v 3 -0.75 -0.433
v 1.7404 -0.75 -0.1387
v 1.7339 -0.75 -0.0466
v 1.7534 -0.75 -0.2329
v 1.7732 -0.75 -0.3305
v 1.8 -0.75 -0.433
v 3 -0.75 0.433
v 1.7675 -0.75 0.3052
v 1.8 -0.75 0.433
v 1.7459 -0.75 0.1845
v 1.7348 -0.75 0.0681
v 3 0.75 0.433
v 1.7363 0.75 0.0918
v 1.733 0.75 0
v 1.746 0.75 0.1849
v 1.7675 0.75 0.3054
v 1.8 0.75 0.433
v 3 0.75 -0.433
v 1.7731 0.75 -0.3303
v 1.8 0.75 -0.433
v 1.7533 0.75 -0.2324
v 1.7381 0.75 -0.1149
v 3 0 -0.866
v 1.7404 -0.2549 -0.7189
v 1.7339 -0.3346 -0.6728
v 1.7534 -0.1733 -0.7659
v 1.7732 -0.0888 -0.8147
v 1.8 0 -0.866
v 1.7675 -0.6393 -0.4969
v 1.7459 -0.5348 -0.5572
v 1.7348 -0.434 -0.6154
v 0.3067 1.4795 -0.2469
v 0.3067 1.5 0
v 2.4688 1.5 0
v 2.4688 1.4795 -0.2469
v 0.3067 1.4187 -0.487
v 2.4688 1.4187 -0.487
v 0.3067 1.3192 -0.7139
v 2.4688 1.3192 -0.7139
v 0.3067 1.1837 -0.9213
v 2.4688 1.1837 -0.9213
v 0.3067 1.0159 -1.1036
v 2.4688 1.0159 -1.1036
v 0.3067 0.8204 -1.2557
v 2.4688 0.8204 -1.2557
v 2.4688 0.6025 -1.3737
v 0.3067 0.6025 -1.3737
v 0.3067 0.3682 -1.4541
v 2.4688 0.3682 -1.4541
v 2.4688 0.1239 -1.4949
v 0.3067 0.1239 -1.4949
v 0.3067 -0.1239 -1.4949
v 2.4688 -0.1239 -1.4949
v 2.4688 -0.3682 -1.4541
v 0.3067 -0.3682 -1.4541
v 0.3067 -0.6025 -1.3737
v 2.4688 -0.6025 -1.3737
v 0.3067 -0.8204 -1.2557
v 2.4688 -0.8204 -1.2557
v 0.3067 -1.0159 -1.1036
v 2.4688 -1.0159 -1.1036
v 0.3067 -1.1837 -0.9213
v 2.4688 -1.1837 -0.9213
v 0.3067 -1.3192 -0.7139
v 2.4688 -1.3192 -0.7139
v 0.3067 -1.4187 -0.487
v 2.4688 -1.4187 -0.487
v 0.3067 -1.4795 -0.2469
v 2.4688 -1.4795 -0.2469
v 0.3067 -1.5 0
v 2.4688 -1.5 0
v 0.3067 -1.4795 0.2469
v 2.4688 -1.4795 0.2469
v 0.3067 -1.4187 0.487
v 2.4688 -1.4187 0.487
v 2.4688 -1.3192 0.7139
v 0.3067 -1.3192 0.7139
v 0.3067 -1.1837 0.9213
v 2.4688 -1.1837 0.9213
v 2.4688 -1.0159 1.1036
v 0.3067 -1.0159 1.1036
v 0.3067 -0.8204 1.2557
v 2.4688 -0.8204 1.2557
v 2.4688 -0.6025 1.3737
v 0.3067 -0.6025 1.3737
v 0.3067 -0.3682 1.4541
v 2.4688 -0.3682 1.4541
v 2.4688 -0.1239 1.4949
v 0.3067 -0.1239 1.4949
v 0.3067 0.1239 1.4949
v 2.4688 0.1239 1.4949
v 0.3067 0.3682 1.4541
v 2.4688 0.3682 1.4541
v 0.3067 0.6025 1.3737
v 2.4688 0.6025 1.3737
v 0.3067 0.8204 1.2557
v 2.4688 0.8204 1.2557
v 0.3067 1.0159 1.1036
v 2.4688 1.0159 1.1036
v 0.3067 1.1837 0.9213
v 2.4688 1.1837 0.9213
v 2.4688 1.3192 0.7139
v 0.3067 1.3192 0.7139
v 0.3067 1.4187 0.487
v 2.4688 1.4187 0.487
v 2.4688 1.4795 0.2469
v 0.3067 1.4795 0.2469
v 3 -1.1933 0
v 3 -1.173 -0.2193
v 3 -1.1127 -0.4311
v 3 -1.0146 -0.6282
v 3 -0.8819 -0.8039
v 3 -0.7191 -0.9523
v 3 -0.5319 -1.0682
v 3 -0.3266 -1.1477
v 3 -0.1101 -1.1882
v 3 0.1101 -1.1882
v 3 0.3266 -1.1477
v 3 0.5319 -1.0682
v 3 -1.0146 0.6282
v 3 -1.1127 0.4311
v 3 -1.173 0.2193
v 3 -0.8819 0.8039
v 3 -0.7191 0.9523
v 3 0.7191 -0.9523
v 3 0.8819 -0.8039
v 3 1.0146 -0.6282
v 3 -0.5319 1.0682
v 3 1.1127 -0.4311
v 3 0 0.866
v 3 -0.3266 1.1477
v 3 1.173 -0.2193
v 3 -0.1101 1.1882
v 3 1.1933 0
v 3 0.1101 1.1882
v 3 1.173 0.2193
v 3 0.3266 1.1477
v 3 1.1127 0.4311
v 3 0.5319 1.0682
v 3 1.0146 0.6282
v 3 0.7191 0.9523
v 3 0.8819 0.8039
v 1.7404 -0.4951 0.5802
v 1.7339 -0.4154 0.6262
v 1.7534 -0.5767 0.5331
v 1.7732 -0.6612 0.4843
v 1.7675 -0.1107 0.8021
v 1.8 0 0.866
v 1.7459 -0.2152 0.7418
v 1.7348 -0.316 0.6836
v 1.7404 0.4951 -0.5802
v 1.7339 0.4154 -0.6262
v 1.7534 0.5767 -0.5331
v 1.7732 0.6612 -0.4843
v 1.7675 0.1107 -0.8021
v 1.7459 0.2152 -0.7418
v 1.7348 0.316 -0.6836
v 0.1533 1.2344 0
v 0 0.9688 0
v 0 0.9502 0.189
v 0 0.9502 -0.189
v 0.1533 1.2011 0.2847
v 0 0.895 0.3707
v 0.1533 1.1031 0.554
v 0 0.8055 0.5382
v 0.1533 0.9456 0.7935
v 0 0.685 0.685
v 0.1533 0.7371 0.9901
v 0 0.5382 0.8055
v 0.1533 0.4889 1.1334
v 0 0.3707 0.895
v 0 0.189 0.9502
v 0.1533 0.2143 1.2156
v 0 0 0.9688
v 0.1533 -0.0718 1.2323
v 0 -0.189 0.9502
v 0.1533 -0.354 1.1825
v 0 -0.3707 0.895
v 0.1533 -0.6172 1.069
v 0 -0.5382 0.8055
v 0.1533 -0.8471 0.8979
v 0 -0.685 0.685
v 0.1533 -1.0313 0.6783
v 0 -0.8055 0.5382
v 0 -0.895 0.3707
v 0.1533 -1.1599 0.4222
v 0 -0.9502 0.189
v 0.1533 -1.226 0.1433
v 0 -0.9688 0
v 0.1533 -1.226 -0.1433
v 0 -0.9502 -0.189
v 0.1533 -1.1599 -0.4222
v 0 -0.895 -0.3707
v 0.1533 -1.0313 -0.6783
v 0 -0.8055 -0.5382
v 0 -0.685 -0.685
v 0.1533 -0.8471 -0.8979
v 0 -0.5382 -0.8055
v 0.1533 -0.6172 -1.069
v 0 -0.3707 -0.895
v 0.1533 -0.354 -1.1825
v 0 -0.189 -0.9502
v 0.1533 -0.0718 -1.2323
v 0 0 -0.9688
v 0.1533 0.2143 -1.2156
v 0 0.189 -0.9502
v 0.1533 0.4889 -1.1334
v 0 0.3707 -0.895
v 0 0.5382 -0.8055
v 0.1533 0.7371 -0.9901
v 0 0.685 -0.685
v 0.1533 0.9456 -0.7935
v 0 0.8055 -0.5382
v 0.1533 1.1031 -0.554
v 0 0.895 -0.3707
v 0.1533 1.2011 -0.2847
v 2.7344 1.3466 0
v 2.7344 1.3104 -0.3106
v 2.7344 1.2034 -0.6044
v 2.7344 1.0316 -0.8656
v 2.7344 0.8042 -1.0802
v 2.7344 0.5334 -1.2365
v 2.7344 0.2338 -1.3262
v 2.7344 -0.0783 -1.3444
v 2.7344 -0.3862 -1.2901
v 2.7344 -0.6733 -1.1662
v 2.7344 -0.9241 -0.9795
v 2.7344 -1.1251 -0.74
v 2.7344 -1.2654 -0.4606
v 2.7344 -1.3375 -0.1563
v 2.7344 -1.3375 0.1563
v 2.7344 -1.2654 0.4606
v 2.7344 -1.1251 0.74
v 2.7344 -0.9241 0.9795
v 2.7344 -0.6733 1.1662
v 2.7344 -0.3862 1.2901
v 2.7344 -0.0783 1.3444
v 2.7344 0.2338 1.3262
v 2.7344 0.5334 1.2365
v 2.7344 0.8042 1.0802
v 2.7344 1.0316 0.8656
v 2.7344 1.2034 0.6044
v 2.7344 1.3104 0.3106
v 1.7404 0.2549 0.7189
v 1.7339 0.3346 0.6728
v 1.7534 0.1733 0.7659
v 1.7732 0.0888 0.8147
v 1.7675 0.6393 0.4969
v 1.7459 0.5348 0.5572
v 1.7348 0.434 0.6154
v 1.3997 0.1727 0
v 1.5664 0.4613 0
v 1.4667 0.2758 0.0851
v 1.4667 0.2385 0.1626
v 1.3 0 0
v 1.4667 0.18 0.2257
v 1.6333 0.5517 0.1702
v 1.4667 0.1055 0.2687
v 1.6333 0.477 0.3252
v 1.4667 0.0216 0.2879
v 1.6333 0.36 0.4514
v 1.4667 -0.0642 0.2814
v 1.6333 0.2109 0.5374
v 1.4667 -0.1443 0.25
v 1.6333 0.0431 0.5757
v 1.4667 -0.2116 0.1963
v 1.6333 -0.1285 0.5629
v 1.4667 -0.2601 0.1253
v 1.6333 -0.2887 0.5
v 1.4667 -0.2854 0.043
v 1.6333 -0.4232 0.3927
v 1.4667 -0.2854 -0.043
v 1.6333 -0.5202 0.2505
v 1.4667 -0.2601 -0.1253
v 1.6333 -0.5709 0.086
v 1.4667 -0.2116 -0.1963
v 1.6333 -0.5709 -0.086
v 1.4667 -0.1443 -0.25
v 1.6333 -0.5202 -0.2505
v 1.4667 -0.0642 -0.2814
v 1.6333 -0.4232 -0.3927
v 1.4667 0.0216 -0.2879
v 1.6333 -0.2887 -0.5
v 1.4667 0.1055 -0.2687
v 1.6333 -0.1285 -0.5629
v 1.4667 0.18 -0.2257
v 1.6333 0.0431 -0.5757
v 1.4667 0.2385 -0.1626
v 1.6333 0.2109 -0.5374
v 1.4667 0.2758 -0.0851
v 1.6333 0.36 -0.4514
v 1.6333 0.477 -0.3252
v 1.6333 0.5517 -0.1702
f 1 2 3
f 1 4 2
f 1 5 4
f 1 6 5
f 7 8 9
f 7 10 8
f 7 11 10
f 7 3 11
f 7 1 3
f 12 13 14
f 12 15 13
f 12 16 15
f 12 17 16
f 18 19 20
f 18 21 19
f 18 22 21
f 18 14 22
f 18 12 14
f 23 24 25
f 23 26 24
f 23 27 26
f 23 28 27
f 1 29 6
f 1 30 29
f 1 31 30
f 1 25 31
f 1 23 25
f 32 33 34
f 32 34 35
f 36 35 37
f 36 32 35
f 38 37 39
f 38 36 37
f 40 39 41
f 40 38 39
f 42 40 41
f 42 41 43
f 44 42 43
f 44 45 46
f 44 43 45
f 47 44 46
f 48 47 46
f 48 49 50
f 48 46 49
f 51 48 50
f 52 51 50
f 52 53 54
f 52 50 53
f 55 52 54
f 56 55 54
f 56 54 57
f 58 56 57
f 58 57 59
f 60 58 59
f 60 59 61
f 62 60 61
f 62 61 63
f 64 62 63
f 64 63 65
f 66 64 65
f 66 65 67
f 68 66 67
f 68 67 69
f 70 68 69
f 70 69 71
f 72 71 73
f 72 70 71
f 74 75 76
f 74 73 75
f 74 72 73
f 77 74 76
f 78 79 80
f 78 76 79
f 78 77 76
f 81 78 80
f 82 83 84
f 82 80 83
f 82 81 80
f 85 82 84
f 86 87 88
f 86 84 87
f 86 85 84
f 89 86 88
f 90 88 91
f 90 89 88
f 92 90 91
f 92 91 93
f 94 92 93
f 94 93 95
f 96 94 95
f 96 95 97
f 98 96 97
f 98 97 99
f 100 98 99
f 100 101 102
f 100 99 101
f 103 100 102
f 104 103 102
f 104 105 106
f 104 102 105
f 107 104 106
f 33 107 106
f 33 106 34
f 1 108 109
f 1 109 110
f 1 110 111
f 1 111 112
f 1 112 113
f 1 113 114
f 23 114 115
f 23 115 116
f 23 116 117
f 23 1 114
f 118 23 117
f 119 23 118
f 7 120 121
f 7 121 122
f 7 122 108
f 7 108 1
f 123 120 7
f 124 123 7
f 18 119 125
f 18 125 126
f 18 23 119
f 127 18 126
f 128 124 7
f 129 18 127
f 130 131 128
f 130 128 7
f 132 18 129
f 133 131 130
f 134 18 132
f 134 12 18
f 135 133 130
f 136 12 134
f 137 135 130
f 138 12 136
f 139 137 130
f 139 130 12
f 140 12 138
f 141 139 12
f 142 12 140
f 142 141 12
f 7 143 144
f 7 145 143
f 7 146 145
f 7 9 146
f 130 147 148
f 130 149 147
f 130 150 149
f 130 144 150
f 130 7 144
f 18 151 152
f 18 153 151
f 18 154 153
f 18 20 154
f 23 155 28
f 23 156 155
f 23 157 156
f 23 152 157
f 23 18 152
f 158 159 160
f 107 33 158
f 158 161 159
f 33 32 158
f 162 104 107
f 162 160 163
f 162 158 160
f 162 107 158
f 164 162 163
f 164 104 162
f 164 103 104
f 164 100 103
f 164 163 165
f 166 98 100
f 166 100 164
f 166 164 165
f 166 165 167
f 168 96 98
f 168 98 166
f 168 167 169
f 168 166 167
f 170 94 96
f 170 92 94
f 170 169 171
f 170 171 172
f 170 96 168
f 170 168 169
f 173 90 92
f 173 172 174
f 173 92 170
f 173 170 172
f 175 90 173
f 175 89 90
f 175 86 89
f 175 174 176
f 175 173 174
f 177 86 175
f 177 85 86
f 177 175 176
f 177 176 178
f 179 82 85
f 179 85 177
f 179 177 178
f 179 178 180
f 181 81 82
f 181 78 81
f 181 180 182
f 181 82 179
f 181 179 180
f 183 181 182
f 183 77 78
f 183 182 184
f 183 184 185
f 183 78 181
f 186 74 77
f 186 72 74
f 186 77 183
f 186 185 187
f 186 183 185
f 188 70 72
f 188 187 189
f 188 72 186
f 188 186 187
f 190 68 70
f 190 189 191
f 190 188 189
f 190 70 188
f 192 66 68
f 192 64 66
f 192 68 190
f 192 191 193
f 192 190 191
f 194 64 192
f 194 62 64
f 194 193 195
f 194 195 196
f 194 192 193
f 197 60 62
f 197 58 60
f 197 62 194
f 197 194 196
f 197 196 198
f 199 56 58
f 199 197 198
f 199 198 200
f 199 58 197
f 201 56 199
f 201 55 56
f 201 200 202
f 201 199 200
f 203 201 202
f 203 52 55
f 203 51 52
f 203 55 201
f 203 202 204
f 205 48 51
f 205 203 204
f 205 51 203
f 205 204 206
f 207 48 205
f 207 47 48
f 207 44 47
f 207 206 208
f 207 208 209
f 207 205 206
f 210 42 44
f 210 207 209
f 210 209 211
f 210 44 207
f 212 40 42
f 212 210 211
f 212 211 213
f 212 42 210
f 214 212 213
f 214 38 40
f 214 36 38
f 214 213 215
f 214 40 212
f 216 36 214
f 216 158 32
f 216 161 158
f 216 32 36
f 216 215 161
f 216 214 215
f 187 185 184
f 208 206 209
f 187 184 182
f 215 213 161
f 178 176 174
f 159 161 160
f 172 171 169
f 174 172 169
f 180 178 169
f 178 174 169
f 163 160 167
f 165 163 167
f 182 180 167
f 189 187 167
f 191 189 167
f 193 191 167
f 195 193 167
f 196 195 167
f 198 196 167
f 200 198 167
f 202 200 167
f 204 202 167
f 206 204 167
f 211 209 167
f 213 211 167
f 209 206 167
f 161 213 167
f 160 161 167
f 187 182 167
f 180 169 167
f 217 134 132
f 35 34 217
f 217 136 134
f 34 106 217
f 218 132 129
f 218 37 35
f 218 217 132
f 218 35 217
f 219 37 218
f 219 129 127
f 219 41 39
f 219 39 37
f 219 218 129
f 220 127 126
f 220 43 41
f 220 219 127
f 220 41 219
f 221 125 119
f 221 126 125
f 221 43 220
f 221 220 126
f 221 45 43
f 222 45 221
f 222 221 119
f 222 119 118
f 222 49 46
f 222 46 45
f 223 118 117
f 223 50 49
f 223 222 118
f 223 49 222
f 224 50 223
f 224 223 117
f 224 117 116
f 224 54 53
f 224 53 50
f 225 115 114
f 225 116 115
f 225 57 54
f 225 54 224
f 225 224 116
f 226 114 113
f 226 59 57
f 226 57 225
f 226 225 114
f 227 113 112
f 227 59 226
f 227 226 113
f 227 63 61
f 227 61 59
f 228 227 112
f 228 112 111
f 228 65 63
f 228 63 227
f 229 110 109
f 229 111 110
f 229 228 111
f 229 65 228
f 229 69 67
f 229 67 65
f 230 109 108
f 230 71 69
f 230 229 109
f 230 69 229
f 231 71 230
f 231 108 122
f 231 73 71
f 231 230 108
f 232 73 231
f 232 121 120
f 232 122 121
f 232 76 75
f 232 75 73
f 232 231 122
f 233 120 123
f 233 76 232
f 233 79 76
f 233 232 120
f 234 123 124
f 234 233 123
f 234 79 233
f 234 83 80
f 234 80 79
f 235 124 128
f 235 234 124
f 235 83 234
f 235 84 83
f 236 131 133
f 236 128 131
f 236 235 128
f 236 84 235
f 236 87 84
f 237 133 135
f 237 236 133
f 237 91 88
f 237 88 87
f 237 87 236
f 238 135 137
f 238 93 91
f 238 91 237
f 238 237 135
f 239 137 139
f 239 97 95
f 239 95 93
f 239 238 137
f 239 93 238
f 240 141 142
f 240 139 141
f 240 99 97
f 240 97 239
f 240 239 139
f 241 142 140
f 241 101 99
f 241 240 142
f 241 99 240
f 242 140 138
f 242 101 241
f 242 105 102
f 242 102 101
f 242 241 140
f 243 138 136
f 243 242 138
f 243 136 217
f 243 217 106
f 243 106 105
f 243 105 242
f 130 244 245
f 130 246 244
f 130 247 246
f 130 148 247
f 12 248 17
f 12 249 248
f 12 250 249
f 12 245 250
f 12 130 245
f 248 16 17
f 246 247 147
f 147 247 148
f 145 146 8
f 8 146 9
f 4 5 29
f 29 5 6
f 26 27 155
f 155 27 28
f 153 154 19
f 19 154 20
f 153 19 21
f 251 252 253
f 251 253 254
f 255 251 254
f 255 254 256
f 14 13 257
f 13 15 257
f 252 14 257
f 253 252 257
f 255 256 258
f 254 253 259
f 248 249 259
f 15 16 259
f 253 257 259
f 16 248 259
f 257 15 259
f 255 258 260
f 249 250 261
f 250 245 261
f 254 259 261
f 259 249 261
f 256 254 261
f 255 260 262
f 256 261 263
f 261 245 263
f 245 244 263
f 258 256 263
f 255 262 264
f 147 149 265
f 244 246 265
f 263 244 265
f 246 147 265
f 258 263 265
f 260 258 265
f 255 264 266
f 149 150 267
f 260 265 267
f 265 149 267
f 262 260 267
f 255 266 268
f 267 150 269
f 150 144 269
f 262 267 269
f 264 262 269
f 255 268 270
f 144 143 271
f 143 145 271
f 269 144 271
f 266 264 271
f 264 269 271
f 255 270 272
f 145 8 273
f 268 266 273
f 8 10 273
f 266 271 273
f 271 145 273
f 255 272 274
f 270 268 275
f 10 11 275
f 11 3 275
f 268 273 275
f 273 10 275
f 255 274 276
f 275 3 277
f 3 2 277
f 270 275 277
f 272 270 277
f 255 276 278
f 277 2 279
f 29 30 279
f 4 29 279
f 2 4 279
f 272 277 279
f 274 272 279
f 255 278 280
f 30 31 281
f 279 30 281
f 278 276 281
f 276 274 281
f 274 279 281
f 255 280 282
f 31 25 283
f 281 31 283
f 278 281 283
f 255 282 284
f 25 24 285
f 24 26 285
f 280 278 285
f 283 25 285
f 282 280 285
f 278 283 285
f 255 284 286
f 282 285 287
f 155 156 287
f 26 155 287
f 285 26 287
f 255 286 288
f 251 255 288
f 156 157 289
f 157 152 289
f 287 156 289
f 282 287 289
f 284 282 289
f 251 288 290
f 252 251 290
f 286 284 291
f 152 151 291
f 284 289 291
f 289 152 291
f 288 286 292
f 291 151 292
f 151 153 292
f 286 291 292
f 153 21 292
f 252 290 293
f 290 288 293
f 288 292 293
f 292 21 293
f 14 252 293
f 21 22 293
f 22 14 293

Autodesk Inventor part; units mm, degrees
ref_plane "YZ Plane" through (0, 0, 0) normal (1, 0, 0) x (0, 1, 0)
ref_plane "XZ Plane" through (0, 0, 0) normal (0, 1, 0) x (-1, 0, 0)
sketch "Sketch1" plane through (0, 0, 0) normal (0, 0, 1) x (1, 0, 0)
  line L0 (0, 0) -> (1.3, 0)
  line L1 (3, 0.866) -> (3, 1.5)
  line L2 (3, 1.5) -> (0, 1.5)
  line L3 (3, 0.866) -> (1.8, 0.866)
  line L4 (1.8, 0.866) -> (1.3, 0)
  line L5 (0, -0.3) -> (0, 1.8) projected
  line L6 (0, 1.5) -> (0, 0)
  dimension "d0" = 1.2
  dimension "d1" = 60
  dimension "d2" = 3
  dimension "d3" = 1.7321
  dimension "d5" = 3
revolve "Body" add sketch "Sketch1" angle 360 about axis through (0, 0, 0) along (1, 0, 0)
chamfer "Chamfer1" distance 0.3067 angle 60 1 edges at (3, -1.5, 0) measured on face at (3, 1.2741, -0.1197)
sketch "Sketch2" plane through (3, 0, 0) normal (1, 0, 0) x (0, 0, -1)
  circle A0 centre (0, 0) radius 0.866 projected
  line L0 (-0.433, 0.75) -> (0.433, 0.75)
  line L1 (0.433, 0.75) -> (0.866, 0)
  line L2 (0.866, 0) -> (0.433, -0.75)
  line L3 (0.433, -0.75) -> (-0.433, -0.75)
  line L4 (-0.433, -0.75) -> (-0.866, 0)
  line L5 (-0.866, 0) -> (-0.433, 0.75)
  point P0 (0, 0)
  point P1 (0, 0)
extrude "Slot" add sketch "Sketch2" against normal up to next contours L1 A0 | A0 L2 | L0 A0 | A0 L3 | L5 A0 | A0 L4
thread "Thread" size "M3x0.5" class "6g" standard "ISO Metric profile" length 3
chamfer "Chamfer2" distance 0.3067 angle 60 1 edges at (0, -1.5, 0) measured on face at (0.8229, 1.4951, -0.1207)
ref_plane "Work Plane1" through (1.5, 0, 0) normal (0, 0.5, 0.866) x (1, 0, 0)
equation "\"d0\" = INTI"
equation "\"d2\" = NND"
equation "\"d3\" = 1.1547 * SW"
equation "\"d5\" = NLG"
equation "\"d7\" = -0.5 * GD1 + 0.5 * NND"
equation "\"d8\" = FAWI"
equation "\"d29\" = -0.5 * GD1 + 0.5 * NND"
equation "\"d11\" = NLG"
equation "\"d13\" = -0.5 * GD1 + 0.5 * NND"
equation "\"d14\" = FAWI"
equation "\"d30\" = -0.5 * GD1 + 0.5 * NND"
equation "\"NND\" = 3"
equation "\"NLG\" = 3"
equation "\"INTI\" = 1.2"
equation "\"FAWI\" = 60deg"
equation "\"SW\" = 1.5"
equation "\"GD1\" = THREADDIA - 1.2269 * PTC"
equation "\"FAWI1\" = 45deg"
equation "\"GUL\" = 0.61345 * PTC"
equation "\"SPD\" = 2"
equation "\"SEWI\" = 120deg"
equation "\"TOA\" = 30deg"
equation "\"THREADDIA\" = 3"
equation "\"PTC\" = 0.5"
equation "\"GAL\" = 0.61345 * PTC"
equation "\"E0\" = 1.155 * SW"
properties part number "Grub Screw 3x3mm" material "Stainless Steel, 440C"
